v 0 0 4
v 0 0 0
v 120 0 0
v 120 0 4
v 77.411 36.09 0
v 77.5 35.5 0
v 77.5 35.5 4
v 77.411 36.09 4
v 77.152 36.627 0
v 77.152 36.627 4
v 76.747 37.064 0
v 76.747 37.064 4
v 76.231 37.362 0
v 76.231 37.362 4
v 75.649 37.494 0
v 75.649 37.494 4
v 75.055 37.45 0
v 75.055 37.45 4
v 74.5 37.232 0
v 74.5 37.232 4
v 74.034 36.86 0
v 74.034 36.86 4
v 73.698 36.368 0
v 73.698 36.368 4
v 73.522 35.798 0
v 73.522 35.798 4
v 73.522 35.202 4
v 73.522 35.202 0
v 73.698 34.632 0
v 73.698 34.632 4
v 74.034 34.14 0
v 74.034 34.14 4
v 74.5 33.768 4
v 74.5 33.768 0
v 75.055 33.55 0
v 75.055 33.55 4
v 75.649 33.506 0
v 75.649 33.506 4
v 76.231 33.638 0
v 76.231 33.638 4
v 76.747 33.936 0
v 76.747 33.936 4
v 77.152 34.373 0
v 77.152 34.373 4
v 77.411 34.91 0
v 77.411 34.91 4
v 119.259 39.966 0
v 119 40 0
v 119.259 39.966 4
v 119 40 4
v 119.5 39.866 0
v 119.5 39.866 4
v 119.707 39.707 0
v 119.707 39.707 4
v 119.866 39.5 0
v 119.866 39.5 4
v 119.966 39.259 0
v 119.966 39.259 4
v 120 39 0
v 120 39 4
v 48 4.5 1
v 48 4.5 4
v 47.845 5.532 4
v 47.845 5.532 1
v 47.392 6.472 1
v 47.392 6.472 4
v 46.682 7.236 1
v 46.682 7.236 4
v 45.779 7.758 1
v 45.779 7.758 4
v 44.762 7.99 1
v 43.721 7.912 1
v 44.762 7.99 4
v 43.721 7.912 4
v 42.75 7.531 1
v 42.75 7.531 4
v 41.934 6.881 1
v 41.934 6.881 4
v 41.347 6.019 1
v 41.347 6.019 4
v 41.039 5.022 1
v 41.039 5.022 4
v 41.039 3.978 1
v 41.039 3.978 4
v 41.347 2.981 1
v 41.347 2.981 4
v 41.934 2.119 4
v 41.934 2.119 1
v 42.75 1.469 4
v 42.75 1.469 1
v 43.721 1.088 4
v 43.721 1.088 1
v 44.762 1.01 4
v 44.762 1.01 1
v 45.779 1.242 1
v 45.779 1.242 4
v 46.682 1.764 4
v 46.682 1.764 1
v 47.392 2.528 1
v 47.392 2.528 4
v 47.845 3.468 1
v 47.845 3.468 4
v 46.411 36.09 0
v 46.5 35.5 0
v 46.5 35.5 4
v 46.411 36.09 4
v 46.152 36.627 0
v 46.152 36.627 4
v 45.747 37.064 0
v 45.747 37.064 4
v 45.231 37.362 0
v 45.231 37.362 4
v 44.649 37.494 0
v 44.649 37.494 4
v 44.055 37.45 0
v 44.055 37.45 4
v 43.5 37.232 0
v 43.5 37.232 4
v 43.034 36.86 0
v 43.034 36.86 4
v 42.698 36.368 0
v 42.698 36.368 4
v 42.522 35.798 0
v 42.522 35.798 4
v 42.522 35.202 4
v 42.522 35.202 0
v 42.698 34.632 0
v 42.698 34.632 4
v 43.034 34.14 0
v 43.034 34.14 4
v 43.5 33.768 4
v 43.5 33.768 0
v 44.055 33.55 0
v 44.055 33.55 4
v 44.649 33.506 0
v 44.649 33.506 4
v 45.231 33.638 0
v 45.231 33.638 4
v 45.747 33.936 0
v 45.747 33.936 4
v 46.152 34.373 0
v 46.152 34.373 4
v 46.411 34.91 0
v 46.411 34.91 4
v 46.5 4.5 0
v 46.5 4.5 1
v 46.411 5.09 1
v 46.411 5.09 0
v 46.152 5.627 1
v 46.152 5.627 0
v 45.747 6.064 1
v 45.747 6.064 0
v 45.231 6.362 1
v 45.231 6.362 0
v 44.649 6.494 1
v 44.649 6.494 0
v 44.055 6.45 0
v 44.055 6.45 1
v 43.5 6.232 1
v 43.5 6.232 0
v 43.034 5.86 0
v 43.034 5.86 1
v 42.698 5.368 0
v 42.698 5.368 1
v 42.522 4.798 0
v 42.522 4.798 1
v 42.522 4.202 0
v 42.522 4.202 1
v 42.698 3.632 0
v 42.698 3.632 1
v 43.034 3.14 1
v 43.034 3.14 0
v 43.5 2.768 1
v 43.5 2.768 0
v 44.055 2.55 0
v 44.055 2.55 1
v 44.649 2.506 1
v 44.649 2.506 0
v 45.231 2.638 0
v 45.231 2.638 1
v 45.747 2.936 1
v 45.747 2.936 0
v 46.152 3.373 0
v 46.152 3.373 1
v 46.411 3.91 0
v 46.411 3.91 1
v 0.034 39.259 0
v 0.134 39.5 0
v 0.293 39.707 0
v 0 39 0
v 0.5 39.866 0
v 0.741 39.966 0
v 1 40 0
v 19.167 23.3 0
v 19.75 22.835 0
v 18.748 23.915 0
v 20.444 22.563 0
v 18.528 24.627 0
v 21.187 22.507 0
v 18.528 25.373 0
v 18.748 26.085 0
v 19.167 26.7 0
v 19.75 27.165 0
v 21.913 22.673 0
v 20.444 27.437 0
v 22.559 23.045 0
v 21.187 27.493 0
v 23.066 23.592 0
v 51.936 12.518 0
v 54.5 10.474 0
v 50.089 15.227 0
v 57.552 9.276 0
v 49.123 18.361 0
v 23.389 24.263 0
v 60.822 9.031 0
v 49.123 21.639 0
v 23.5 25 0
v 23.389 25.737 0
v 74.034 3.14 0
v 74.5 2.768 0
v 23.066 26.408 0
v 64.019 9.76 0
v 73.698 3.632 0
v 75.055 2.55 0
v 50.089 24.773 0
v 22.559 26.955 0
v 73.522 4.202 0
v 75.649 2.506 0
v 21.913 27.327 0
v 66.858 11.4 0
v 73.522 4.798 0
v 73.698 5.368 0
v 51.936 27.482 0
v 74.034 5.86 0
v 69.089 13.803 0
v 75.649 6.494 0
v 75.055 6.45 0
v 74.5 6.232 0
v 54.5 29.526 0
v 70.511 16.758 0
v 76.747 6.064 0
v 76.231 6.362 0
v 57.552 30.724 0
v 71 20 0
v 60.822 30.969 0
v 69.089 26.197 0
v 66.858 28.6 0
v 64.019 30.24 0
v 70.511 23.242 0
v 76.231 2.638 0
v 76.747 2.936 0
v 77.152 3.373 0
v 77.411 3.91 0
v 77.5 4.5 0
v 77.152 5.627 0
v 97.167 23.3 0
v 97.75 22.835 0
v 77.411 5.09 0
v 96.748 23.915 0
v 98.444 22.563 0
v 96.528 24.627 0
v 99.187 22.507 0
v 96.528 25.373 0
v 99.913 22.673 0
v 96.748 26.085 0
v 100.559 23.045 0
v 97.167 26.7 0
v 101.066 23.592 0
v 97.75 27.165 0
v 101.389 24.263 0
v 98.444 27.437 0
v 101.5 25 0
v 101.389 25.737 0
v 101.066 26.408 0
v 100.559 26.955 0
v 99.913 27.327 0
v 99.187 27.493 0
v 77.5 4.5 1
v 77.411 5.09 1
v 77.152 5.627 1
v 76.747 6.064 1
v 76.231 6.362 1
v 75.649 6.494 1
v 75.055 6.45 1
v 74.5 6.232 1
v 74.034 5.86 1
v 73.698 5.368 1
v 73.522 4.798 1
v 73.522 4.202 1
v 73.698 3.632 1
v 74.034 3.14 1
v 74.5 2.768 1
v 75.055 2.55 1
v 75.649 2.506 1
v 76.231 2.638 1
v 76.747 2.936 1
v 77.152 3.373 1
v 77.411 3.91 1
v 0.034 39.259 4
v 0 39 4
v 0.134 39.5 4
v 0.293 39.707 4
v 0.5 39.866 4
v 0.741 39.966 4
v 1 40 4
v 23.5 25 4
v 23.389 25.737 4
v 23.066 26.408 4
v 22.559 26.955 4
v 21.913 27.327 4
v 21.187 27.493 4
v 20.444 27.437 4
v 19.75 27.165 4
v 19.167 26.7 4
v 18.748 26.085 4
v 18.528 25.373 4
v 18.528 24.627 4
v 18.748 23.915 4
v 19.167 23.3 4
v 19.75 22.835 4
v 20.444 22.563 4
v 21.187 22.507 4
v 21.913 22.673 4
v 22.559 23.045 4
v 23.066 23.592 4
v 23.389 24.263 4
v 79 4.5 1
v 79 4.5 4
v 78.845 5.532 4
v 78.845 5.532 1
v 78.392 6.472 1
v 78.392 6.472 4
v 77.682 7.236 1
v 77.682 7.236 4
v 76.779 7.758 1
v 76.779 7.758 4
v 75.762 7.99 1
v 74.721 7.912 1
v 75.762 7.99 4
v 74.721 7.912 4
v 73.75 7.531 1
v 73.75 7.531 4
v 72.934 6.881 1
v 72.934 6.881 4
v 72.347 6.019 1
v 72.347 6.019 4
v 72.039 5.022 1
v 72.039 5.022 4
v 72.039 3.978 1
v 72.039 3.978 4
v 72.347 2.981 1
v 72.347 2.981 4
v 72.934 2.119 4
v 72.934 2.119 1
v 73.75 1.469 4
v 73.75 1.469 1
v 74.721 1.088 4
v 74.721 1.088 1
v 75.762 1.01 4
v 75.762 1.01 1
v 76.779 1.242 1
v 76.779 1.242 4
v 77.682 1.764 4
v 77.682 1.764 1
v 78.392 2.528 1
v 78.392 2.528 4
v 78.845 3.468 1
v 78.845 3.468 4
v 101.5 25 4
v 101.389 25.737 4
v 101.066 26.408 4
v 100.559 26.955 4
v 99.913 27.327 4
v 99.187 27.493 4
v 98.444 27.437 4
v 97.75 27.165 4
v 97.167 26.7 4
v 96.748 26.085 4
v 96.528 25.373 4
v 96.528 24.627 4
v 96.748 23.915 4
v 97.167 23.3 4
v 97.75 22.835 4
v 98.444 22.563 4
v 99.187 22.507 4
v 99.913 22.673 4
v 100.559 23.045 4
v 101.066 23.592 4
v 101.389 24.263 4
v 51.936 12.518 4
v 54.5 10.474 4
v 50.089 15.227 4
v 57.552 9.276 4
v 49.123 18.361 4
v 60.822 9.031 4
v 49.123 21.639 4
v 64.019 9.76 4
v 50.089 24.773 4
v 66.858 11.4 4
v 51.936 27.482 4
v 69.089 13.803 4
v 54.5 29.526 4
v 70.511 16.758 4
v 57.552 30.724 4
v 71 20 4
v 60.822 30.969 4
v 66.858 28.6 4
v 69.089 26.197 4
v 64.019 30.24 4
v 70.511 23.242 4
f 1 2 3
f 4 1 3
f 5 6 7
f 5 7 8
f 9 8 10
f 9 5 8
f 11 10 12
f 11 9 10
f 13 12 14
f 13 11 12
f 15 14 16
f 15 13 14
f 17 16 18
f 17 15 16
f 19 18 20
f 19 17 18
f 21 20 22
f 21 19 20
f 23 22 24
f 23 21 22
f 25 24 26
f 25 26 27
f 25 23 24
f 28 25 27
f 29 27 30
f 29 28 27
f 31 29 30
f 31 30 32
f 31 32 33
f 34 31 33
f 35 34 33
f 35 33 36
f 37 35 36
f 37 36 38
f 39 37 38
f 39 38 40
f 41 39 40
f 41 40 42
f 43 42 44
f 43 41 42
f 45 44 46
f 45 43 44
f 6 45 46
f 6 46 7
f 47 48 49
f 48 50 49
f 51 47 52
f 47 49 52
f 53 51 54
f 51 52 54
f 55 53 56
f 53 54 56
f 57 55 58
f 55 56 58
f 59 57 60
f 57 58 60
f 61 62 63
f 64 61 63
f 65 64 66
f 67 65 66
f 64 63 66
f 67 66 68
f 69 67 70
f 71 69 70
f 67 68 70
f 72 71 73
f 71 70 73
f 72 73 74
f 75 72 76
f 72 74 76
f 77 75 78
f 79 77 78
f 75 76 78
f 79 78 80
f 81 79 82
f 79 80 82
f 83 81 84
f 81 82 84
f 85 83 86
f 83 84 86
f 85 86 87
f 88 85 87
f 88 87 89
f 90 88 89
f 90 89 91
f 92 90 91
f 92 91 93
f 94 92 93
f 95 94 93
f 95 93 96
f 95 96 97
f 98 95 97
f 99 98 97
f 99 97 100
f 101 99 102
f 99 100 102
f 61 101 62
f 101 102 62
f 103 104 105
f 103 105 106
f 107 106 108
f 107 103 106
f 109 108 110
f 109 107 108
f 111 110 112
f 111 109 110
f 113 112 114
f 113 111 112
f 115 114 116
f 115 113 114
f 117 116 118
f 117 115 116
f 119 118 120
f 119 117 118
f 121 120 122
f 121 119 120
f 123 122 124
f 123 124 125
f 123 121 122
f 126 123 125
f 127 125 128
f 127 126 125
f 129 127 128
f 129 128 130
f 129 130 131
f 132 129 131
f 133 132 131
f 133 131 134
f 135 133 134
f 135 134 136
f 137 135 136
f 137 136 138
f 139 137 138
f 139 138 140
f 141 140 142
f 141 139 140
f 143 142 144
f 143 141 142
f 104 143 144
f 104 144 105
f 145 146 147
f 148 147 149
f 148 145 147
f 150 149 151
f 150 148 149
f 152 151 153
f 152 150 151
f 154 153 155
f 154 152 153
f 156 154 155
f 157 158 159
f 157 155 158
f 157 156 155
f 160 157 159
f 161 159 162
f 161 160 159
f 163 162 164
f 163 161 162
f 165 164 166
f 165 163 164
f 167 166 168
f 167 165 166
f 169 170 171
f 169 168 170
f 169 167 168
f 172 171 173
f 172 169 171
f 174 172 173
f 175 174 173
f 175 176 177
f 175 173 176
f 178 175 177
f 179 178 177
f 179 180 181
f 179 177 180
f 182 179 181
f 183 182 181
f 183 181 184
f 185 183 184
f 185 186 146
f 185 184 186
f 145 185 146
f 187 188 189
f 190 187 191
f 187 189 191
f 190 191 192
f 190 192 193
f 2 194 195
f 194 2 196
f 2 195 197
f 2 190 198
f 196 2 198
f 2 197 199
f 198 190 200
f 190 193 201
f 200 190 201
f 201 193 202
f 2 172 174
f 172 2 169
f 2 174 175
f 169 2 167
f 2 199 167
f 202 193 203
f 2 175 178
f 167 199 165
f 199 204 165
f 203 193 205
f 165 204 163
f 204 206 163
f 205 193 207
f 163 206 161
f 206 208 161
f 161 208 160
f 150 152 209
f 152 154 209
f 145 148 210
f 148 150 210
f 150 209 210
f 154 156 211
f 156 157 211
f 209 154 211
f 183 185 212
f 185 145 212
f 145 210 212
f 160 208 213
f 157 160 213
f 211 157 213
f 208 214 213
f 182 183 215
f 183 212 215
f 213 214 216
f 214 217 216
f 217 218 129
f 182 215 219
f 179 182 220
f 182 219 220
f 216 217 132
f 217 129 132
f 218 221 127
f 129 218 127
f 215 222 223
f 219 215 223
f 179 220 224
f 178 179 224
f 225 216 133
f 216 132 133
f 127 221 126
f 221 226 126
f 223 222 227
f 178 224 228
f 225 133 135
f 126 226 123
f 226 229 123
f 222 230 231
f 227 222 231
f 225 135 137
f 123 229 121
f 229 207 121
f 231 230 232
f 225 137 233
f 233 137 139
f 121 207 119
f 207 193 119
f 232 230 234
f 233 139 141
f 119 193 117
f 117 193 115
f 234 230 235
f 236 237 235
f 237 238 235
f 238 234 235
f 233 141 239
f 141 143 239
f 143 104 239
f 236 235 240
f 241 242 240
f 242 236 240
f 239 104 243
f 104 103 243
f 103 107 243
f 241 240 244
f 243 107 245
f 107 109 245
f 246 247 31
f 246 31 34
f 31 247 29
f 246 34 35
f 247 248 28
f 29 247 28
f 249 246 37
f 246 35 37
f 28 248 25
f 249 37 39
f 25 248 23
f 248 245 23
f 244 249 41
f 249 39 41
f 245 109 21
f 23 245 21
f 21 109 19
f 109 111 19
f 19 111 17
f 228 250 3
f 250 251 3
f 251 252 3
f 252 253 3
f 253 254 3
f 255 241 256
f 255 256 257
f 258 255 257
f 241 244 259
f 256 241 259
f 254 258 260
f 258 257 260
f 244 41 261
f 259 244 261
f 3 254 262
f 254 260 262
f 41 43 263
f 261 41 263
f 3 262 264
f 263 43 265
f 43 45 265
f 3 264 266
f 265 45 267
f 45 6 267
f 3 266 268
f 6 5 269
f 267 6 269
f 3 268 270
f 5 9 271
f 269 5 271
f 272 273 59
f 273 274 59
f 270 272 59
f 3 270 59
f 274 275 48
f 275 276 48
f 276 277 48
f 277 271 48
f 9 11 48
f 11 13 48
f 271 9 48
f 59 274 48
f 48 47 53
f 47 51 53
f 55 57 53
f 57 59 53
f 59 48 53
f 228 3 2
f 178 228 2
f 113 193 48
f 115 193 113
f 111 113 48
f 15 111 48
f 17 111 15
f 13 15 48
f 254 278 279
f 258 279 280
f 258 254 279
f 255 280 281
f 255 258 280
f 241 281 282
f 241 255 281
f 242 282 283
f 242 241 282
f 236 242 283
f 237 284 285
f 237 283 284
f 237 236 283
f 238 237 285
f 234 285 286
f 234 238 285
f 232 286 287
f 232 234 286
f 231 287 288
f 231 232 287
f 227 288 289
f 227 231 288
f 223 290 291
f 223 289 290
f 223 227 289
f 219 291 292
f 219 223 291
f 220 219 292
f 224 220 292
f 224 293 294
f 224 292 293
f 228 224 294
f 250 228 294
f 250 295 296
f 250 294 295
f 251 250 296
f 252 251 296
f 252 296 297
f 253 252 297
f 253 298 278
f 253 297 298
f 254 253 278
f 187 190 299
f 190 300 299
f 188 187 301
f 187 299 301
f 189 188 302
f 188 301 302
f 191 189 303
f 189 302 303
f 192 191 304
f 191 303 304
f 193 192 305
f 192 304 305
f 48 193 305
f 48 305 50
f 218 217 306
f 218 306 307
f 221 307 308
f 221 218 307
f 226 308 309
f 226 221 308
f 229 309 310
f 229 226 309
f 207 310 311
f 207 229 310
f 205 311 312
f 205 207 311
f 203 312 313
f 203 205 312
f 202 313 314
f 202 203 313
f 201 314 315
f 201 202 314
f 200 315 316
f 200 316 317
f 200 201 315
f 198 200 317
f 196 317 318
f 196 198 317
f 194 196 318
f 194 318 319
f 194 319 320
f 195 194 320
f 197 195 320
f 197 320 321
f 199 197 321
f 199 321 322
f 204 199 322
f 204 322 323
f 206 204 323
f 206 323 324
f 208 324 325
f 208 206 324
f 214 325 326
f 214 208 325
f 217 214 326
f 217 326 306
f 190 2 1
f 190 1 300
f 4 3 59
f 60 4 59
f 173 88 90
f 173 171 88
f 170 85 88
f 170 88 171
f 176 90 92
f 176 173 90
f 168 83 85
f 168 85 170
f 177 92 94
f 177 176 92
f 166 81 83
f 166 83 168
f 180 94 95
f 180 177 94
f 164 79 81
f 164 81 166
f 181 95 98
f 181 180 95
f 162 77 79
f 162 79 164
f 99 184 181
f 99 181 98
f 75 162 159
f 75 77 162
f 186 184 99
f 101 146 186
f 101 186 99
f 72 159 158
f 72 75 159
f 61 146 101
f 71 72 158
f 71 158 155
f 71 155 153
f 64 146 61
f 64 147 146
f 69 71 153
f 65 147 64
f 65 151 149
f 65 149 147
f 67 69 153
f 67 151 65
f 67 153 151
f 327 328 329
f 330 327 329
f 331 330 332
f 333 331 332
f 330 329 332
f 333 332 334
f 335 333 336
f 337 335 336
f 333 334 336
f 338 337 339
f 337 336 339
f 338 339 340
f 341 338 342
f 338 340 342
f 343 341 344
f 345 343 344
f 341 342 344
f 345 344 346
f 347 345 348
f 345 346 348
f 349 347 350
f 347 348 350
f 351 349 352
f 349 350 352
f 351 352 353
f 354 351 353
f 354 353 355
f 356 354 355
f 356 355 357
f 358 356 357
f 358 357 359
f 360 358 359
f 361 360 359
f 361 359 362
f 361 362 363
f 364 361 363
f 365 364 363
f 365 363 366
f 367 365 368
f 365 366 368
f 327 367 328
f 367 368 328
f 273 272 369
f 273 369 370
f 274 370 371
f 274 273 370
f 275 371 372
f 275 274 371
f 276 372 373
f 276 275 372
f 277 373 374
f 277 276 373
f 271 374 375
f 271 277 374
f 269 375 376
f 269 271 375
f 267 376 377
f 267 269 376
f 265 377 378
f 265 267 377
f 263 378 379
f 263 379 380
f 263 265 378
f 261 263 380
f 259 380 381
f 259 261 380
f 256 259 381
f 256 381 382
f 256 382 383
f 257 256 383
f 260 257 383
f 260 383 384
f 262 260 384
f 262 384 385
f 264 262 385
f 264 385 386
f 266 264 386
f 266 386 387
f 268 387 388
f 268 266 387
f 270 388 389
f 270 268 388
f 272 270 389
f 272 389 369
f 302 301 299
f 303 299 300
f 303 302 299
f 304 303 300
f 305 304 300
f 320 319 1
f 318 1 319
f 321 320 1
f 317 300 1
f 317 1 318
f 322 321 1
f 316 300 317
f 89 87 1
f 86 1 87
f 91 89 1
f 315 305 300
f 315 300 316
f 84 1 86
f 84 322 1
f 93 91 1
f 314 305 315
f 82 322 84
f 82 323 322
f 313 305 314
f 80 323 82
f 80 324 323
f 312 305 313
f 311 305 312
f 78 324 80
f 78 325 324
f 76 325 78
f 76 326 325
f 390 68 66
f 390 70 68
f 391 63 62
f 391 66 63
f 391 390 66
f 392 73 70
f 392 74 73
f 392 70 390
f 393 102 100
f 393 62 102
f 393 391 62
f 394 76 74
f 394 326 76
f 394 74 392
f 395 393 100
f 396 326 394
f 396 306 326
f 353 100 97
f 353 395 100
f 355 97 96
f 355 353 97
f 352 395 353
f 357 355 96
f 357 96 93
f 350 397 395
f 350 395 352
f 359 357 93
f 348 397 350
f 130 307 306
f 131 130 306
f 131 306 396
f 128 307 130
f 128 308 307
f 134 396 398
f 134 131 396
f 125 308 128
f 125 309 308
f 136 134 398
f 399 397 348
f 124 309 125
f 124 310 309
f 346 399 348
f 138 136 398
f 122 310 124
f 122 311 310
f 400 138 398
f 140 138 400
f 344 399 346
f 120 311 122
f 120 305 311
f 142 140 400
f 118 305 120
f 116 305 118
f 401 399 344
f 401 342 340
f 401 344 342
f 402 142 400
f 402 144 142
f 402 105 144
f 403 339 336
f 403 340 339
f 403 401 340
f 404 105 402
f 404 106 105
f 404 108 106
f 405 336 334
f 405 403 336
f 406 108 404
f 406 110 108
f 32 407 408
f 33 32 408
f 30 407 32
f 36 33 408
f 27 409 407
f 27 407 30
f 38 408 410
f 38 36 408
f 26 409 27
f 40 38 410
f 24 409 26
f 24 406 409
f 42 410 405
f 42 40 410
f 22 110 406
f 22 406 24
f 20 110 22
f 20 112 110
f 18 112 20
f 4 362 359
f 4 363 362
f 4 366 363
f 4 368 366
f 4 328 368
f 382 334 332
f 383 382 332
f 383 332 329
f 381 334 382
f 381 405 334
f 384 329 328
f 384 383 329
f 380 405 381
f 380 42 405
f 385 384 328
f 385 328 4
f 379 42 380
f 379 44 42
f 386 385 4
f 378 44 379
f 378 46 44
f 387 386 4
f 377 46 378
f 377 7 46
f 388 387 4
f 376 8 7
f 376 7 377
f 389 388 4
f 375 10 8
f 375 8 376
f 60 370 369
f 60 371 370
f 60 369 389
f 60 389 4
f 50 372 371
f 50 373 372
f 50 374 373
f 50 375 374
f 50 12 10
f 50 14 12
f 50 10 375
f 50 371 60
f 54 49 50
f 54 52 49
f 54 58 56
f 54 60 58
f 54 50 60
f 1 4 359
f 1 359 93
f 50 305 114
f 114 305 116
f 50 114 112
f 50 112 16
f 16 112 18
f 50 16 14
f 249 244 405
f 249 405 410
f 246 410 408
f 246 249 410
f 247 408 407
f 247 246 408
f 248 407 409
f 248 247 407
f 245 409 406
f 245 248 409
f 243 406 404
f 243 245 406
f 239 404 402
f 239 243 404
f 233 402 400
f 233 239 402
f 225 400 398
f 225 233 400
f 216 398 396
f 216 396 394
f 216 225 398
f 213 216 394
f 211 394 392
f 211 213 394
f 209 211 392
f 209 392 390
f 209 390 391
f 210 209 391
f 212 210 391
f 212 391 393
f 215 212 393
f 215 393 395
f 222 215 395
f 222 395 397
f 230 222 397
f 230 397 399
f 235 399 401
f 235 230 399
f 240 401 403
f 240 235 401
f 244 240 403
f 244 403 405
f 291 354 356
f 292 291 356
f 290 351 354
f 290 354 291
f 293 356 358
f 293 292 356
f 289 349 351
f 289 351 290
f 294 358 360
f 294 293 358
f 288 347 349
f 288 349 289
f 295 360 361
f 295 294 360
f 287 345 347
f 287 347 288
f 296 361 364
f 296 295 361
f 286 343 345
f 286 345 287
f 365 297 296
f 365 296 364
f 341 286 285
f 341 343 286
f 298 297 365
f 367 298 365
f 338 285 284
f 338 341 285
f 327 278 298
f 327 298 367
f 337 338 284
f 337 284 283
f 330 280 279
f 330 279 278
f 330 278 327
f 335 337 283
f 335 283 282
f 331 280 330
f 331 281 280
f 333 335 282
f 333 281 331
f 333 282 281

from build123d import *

# Parameters (mm, degrees)
SKETCH1_W           = 120
SKETCH1_H           = 40
SKETCH1_R           = 2.5
SKETCH1_R_2         = 11
SKETCH1_R_3         = 2
BOSS_EXTRUDE1_DEPTH = 4
FILLET1_R           = 1
SKETCH2_R           = 3.5
CUT_EXTRUDE1_DEPTH  = 3


with BuildPart() as part:
    # Sketch1 → Boss-Extrude1 (new body)
    with BuildSketch(Plane.XY):
        with Locations((60, 20)):
            Rectangle(SKETCH1_W, SKETCH1_H)
        with Locations((21, 25)):
            Circle(SKETCH1_R, mode=Mode.SUBTRACT)
        with Locations((99, 25)):
            Circle(SKETCH1_R, mode=Mode.SUBTRACT)
        with Locations((60, 20)):
            Circle(SKETCH1_R_2, mode=Mode.SUBTRACT)
        with Locations((75.5, 35.5)):
            Circle(SKETCH1_R_3, mode=Mode.SUBTRACT)
        with Locations((75.5, 4.5)):
            Circle(SKETCH1_R_3, mode=Mode.SUBTRACT)
        with Locations((44.5, 4.5)):
            Circle(SKETCH1_R_3, mode=Mode.SUBTRACT)
        with Locations((44.5, 35.5)):
            Circle(SKETCH1_R_3, mode=Mode.SUBTRACT)
    extrude(amount=BOSS_EXTRUDE1_DEPTH)

    # Fillet1
    fillet1_edges = [part.edges().sort_by_distance(p)[0] for p in [
        (0, 40, 2),
        (120, 40, 2),
    ]]
    fillet(fillet1_edges, radius=FILLET1_R)

    # Sketch2 → Cut-Extrude1 (cut)
    with BuildSketch(Plane.XY.offset(4)):
        with Locations((44.5, 4.5)):
            Circle(SKETCH2_R)
        with Locations((75.5, 4.5)):
            Circle(SKETCH2_R)
    extrude(amount=-CUT_EXTRUDE1_DEPTH, mode=Mode.SUBTRACT)


solid = part.part
